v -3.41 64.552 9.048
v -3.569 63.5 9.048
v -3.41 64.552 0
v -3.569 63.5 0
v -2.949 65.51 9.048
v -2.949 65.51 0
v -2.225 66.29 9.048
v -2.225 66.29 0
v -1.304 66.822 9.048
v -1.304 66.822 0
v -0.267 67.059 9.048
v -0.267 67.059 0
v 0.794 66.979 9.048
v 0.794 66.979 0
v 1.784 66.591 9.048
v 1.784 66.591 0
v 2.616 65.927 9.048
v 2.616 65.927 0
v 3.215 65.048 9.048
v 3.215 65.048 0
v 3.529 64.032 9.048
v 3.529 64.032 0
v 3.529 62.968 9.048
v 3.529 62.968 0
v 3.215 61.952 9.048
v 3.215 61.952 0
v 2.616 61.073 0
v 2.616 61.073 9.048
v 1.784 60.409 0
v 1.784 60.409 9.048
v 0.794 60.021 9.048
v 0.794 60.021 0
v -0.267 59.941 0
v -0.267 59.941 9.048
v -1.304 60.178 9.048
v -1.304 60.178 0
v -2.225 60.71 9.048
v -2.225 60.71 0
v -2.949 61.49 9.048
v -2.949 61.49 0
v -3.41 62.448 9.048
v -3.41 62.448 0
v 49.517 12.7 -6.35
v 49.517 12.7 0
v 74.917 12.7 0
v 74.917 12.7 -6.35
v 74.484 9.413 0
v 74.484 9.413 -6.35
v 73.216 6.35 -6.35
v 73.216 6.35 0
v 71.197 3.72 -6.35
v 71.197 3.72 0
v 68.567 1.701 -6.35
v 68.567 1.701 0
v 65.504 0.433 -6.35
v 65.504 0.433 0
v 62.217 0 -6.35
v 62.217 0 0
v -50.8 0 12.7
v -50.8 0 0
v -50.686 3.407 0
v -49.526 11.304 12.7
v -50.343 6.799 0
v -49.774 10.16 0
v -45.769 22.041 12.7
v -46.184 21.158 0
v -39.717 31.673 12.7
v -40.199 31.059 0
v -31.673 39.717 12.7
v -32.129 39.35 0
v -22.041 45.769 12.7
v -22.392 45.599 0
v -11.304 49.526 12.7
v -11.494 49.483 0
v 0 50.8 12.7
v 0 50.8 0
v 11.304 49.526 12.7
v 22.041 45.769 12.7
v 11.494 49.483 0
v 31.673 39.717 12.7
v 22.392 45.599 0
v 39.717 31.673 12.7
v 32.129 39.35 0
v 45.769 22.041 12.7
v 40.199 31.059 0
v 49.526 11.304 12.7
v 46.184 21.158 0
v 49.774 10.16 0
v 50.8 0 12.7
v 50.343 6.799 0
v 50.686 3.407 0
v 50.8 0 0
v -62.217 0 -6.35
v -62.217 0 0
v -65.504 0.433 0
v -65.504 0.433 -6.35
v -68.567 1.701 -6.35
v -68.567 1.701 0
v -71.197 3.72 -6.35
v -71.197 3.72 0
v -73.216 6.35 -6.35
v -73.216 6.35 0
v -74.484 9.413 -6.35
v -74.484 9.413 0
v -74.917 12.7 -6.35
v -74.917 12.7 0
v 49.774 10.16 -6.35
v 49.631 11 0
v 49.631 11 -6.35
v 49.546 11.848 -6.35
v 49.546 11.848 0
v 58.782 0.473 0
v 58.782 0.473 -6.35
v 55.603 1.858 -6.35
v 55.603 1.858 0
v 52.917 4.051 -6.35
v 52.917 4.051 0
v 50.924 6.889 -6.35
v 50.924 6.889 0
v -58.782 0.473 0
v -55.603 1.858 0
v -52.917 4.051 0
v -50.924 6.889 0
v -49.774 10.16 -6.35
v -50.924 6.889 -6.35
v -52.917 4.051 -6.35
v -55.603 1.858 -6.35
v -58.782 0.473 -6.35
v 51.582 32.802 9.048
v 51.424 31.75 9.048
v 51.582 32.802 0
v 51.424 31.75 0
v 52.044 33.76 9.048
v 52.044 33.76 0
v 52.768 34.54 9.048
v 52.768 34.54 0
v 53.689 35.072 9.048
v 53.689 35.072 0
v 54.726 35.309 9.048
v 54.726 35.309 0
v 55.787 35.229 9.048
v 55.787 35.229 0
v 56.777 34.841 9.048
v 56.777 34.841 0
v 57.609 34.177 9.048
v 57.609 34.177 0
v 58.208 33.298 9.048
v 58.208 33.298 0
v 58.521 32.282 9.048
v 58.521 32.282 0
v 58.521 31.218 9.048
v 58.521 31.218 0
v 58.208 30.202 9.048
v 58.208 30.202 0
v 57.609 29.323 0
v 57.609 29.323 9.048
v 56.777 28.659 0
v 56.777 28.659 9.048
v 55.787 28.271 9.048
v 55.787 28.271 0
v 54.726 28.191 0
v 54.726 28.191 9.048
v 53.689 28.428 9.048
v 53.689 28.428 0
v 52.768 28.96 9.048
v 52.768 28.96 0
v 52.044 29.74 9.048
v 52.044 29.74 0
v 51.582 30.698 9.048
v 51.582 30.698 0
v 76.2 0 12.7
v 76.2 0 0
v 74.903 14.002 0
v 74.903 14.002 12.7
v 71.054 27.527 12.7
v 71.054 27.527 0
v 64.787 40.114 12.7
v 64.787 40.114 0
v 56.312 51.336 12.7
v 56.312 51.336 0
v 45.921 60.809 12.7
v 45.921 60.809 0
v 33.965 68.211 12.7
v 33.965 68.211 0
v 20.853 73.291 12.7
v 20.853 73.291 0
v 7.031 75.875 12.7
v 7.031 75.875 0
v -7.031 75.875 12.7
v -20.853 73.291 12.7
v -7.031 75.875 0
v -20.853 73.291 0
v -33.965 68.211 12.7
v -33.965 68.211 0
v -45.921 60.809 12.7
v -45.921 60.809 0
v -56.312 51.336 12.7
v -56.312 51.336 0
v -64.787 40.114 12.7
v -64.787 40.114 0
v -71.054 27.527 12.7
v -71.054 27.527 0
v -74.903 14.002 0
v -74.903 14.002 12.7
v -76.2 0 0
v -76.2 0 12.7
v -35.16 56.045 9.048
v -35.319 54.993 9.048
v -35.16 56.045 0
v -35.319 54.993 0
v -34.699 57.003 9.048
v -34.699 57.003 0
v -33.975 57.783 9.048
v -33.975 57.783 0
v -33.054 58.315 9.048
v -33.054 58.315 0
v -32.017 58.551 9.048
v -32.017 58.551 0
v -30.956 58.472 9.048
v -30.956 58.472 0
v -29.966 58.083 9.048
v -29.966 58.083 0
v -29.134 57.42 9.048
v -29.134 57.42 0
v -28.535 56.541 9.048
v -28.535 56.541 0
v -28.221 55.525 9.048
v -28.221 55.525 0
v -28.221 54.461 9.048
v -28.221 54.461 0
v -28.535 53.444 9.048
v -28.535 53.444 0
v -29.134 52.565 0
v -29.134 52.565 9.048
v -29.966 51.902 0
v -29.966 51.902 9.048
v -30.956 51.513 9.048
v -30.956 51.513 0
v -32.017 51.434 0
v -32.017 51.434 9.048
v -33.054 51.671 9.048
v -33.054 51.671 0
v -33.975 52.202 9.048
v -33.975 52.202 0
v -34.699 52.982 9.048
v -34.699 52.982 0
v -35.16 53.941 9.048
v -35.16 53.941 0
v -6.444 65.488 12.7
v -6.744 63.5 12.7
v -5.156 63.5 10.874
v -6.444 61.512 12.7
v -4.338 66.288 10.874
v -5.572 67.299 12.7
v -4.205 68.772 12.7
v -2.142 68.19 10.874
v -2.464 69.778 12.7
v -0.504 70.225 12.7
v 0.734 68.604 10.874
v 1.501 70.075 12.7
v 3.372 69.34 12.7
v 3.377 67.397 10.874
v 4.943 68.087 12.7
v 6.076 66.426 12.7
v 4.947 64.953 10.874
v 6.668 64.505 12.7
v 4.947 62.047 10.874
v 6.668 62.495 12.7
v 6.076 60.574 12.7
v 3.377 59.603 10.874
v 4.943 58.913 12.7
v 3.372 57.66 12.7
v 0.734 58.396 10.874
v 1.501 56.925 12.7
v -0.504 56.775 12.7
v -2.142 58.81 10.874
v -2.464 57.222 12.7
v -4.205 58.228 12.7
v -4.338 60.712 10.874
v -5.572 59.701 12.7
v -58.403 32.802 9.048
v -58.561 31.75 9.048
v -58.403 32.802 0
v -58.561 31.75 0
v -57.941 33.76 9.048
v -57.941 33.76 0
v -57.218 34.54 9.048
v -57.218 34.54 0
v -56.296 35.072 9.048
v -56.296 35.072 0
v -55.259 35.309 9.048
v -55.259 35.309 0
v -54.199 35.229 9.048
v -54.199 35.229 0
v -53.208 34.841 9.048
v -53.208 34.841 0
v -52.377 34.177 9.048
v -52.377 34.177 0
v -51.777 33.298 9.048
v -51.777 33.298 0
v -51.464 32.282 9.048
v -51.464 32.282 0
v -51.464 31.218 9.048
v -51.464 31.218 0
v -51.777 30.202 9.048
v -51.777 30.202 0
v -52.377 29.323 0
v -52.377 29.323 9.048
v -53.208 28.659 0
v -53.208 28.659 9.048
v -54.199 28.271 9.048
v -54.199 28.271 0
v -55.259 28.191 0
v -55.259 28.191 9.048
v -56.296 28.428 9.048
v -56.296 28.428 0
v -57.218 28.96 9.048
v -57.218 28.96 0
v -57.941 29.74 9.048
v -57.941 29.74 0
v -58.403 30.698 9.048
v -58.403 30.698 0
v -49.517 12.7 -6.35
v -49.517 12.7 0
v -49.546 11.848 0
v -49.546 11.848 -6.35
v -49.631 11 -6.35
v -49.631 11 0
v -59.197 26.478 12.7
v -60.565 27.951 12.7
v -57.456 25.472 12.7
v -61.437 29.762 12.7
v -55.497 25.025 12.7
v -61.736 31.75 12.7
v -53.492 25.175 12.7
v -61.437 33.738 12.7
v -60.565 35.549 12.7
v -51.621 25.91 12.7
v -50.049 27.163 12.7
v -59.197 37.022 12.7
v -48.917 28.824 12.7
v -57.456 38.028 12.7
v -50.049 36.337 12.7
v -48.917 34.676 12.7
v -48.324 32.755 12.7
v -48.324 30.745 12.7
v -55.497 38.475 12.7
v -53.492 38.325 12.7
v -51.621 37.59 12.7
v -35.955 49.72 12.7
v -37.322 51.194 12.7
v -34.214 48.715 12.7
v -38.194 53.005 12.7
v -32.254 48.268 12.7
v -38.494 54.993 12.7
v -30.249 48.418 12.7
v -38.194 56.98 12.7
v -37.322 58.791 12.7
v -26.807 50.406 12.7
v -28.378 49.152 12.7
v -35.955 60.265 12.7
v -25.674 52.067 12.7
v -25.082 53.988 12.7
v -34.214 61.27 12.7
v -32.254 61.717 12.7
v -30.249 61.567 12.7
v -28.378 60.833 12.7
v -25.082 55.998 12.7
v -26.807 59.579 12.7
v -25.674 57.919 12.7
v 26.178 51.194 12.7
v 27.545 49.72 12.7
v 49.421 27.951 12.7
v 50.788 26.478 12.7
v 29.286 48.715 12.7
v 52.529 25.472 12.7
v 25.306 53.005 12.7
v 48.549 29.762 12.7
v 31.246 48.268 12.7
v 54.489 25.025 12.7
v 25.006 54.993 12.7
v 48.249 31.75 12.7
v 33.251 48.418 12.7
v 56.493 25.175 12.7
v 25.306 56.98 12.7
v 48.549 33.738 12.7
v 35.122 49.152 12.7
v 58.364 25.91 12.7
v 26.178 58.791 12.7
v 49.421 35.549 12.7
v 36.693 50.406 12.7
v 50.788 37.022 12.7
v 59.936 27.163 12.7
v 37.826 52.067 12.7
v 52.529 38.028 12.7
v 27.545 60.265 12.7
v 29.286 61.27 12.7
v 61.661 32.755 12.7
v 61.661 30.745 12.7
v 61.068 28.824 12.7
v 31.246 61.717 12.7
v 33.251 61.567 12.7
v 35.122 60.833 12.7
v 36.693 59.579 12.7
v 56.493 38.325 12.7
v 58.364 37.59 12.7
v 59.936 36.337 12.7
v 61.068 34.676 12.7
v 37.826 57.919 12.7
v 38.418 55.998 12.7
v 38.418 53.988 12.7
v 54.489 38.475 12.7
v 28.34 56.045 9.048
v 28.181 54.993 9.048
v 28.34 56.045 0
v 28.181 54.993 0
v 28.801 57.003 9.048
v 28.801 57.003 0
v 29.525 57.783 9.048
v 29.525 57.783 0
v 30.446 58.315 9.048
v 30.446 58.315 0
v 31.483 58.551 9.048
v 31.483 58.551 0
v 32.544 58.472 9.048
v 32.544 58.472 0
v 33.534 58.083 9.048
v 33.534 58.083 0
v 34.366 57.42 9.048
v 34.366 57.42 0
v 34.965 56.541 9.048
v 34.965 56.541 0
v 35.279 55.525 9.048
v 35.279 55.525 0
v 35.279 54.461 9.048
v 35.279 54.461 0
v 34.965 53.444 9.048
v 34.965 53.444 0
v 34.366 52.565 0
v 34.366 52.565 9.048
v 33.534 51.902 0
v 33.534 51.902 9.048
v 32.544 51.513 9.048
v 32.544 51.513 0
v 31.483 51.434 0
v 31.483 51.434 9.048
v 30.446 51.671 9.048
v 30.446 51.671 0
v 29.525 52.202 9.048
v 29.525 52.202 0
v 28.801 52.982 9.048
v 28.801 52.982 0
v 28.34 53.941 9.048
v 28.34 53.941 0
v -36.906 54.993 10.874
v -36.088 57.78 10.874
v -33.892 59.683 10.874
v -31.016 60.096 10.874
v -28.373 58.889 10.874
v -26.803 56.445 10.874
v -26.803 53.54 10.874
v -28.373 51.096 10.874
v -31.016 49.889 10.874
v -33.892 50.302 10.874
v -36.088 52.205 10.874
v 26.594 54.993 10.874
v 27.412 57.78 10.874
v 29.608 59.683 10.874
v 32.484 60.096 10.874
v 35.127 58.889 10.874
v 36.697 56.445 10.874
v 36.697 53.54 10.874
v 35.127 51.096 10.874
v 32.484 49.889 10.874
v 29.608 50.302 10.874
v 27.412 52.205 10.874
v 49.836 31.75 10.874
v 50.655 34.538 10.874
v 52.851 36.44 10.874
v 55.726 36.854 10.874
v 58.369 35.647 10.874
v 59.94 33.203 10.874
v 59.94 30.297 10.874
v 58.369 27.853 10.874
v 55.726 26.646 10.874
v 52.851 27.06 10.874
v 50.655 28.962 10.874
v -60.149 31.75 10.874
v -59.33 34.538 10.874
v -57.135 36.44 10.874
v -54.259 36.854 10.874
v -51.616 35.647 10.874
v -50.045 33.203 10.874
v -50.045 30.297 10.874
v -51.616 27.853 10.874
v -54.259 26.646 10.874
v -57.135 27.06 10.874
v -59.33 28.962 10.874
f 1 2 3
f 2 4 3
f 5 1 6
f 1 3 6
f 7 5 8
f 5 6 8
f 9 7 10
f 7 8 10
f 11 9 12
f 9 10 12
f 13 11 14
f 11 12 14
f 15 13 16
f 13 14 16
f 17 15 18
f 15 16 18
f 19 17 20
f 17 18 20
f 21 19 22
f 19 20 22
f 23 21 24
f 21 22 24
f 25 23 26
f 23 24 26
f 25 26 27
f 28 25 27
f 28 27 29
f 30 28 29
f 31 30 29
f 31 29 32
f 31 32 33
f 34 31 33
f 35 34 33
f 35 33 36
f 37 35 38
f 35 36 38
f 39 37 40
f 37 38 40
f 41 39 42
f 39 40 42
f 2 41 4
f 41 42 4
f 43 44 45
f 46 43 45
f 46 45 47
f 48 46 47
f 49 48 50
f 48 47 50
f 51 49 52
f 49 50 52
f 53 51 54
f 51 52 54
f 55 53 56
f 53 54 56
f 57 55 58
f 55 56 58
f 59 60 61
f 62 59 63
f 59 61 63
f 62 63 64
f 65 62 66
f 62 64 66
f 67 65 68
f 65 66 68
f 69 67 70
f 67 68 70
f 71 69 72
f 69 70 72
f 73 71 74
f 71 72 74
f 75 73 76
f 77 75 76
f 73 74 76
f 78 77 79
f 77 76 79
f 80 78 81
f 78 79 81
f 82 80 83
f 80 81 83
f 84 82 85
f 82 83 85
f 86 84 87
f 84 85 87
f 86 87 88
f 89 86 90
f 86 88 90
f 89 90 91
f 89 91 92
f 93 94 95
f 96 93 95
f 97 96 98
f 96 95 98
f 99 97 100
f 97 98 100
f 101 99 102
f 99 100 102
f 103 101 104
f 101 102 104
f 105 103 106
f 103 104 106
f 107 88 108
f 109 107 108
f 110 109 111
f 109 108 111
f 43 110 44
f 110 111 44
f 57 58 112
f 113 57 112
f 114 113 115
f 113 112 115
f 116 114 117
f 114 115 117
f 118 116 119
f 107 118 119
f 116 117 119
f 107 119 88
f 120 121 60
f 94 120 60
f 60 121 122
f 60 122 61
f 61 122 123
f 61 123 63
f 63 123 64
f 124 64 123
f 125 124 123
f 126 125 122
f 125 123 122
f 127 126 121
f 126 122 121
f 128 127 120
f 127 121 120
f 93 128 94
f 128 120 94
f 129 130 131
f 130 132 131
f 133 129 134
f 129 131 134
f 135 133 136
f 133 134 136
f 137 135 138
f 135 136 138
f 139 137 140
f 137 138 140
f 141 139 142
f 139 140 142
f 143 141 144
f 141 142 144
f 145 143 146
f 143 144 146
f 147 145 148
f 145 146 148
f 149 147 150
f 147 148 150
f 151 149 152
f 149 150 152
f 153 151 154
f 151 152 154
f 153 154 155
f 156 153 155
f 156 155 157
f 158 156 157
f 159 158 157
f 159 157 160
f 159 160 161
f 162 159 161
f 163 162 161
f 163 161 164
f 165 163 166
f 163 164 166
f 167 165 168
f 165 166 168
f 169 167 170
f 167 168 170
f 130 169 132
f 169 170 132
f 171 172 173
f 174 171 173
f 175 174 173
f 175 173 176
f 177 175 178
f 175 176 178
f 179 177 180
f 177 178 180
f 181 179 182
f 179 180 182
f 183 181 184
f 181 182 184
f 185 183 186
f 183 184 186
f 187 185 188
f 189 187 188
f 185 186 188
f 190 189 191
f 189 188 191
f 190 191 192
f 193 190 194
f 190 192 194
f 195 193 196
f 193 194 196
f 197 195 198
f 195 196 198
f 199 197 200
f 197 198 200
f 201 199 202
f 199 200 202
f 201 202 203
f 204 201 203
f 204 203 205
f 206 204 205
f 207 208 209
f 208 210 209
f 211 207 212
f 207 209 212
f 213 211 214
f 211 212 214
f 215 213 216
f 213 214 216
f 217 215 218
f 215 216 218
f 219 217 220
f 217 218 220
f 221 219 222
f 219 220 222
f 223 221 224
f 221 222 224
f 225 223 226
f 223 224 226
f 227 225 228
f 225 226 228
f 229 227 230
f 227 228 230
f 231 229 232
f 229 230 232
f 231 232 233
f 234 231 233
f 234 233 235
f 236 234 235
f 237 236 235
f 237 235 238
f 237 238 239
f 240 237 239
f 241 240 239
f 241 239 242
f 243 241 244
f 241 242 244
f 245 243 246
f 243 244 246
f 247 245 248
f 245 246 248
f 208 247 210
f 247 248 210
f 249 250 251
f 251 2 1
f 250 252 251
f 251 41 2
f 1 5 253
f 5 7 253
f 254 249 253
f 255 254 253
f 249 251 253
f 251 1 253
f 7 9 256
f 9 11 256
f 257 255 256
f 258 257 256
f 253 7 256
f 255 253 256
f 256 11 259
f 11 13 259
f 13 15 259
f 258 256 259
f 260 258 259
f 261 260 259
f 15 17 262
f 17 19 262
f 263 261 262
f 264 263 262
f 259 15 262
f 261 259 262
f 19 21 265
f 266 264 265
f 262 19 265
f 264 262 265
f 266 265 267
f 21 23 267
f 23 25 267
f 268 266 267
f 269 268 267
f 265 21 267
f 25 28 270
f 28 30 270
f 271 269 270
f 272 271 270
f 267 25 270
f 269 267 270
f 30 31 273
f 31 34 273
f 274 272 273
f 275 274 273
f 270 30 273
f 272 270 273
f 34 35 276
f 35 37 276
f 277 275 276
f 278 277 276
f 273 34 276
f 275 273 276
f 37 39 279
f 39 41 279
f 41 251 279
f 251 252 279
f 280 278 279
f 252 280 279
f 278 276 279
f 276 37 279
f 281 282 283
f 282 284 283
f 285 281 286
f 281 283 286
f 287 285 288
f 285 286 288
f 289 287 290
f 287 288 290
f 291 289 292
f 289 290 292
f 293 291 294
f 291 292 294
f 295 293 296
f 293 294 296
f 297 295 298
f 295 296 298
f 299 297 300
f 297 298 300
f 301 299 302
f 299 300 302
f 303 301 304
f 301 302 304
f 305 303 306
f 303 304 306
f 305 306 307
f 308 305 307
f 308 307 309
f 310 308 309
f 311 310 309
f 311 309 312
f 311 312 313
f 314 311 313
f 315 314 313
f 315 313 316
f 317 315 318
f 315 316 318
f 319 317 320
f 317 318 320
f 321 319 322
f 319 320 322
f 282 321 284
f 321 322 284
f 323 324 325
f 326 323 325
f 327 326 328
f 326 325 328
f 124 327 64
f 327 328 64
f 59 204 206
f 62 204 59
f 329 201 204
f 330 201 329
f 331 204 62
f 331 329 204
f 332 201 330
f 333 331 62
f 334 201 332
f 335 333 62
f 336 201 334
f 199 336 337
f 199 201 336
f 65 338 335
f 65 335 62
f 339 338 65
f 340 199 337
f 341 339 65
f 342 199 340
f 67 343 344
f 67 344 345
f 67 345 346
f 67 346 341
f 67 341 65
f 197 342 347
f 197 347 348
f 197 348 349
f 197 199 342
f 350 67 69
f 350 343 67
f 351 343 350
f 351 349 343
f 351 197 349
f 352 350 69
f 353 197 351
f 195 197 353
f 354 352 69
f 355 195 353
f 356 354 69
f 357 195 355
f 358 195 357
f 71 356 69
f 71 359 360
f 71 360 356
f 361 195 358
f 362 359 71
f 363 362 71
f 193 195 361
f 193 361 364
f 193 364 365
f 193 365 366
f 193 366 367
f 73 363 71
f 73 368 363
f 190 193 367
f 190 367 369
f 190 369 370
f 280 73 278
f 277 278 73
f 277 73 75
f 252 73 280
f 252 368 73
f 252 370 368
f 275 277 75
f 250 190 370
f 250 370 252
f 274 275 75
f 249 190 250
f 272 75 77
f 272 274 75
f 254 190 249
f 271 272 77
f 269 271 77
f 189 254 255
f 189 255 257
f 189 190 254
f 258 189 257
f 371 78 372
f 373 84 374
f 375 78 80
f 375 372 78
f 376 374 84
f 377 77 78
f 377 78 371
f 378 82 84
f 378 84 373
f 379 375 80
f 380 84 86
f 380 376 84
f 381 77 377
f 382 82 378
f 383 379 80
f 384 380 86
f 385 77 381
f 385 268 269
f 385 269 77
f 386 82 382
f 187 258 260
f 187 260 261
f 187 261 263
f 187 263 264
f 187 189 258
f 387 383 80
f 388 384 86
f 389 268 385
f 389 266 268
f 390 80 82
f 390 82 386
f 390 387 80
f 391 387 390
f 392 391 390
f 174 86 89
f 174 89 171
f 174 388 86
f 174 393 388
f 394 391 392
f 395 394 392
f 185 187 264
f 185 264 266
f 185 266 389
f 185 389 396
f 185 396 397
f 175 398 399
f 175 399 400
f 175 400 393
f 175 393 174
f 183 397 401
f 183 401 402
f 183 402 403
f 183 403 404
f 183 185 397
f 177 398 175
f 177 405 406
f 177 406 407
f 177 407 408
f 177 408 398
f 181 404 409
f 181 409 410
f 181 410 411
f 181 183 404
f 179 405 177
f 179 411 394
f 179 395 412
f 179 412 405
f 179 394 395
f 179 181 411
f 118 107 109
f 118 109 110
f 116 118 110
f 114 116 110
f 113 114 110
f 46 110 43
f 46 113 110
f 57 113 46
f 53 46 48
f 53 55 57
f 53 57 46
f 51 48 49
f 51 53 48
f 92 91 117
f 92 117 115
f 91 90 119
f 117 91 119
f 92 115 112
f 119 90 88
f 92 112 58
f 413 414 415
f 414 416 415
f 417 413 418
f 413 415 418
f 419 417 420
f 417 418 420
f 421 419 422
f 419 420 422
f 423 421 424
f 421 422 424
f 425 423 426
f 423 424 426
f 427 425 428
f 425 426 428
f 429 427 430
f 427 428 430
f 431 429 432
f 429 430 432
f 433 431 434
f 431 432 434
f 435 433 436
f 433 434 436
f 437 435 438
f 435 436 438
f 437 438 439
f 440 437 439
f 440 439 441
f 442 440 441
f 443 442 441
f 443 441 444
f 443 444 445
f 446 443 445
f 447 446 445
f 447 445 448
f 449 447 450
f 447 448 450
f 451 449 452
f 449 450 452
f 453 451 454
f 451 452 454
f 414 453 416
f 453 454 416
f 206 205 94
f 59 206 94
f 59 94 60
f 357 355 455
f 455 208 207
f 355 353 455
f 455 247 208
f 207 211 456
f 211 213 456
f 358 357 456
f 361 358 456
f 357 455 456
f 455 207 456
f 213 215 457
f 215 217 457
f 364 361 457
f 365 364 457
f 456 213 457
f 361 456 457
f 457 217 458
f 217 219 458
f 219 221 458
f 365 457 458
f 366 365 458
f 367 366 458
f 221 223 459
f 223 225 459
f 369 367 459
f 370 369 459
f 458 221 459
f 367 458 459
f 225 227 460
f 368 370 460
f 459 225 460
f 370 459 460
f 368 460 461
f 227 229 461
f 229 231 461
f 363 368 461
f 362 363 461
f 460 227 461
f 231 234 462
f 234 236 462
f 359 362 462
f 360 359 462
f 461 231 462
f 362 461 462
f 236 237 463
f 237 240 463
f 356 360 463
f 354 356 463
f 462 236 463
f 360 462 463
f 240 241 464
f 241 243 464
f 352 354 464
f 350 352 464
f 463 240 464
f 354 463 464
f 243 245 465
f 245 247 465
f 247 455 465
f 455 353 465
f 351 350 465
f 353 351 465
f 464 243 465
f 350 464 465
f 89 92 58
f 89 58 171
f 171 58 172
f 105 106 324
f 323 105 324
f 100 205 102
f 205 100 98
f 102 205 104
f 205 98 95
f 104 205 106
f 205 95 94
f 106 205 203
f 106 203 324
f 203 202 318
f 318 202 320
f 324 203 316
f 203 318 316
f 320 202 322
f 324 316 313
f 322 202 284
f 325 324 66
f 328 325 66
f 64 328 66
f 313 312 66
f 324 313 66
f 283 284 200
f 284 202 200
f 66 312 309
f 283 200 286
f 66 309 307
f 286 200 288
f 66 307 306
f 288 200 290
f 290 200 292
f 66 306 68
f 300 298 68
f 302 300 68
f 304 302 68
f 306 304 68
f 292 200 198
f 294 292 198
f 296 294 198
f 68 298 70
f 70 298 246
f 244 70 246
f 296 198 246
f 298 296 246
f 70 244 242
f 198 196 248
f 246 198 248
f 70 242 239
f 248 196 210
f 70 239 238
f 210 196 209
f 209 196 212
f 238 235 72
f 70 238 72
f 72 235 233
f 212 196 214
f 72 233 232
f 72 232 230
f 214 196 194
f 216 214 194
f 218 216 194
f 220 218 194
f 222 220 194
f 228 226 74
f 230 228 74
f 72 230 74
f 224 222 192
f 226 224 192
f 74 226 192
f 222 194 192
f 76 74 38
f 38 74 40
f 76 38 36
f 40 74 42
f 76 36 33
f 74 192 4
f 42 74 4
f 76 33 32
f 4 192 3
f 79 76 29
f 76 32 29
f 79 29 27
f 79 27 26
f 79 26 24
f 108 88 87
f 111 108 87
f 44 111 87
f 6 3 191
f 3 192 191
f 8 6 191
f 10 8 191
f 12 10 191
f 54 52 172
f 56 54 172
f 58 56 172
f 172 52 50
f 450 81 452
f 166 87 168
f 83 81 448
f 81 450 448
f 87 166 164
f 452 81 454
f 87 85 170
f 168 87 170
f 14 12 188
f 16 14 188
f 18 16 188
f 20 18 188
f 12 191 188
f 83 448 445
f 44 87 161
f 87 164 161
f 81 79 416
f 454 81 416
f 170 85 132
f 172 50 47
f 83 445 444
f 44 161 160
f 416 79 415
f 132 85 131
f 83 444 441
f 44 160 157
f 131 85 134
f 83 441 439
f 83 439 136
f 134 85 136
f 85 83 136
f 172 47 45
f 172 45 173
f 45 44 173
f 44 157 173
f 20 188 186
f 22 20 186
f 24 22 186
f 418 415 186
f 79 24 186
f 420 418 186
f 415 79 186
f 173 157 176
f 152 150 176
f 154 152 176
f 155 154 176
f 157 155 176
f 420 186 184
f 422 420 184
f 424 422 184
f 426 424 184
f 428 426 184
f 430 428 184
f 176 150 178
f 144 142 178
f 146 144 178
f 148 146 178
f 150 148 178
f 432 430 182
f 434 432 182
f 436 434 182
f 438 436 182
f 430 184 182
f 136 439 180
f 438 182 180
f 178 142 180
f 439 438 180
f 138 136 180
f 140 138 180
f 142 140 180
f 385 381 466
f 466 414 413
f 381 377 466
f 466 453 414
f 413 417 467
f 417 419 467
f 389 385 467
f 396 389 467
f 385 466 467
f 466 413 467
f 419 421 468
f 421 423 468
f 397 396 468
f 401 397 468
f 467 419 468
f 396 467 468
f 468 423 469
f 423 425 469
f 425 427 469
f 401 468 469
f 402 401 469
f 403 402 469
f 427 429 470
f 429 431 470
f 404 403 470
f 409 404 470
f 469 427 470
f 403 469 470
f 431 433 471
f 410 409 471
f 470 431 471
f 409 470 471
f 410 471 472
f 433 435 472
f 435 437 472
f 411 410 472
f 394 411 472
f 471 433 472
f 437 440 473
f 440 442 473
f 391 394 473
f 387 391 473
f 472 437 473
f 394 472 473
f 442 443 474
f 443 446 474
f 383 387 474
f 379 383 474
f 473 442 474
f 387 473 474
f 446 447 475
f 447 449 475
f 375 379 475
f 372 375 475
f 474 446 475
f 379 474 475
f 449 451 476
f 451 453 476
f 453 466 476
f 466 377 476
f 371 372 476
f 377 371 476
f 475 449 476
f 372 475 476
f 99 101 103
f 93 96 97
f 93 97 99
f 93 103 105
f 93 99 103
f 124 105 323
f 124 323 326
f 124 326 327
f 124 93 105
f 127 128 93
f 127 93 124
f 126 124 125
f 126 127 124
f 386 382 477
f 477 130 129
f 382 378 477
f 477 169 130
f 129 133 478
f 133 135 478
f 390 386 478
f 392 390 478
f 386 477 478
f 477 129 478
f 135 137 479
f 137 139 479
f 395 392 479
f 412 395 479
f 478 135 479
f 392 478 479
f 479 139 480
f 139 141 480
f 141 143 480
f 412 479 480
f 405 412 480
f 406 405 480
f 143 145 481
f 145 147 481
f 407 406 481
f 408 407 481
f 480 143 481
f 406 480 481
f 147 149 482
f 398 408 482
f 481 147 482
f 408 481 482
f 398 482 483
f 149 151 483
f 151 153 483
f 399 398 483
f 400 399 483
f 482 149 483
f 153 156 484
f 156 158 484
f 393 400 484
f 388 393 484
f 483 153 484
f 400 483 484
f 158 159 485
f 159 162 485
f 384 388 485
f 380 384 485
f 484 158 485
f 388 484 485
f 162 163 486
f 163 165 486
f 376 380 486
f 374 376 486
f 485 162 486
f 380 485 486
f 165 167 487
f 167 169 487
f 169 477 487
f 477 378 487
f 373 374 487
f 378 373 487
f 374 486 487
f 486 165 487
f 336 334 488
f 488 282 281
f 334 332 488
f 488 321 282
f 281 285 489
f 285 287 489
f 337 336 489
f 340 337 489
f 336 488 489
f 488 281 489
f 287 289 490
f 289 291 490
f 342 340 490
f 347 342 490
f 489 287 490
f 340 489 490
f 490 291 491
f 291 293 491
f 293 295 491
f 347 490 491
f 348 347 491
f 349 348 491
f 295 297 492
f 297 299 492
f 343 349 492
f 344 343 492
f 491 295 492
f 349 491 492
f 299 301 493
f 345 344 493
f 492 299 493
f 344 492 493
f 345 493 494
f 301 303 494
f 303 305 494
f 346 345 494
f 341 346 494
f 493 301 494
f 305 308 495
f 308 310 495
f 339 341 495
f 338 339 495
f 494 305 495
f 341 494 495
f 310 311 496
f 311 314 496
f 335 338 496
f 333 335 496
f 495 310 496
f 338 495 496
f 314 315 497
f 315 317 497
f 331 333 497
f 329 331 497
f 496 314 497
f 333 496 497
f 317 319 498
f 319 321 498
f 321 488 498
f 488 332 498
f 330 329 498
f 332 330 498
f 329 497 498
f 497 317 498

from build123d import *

# Parameters (mm, degrees)
F1_DEPTH       = 12.7
F3_DEPTH       = 6.35
F5_D           = 7.1374
F5_CSINK_D     = 13.4874
F5_CSINK_ANGLE = 82


with BuildPart() as f1:
    # F0 (on Top) → F1 (new body)
    with BuildSketch(Plane.XY):
        with BuildLine():
            Line((-76.2, 0), (-50.8, 0))
            ThreePointArc((-50.8, 0), (0, 50.8), (50.8, 0))
            Line((50.8, 0), (76.2, 0))
            ThreePointArc((76.2, 0), (0, 76.2), (-76.2, 0))
        make_face()
    extrude(amount=F1_DEPTH)

    # F2 (on face) → F3 (join)
    with BuildSketch(Plane(origin=(0, 0, 0), x_dir=(1, 0, 0), z_dir=(0, 0, -1))):
        with BuildLine():
            Line((-74.9170394667, -12.7), (-49.5170394667, -12.7))
            ThreePointArc((-49.5170394667, -12.7), (-49.581350313, -11.4235362865), (-49.7736315316, -10.1600002047))
            ThreePointArc((-49.7736315316, -10.1600002047), (-54.1848541289, -2.8626223667), (-62.2170394667, 0))
            ThreePointArc((-62.2170394667, 0), (-71.1972955878, -3.7197438789), (-74.9170394667, -12.7))
        make_face()
        with BuildLine():
            ThreePointArc((62.2170394667, 0), (54.1848541308, -2.8626223652), (49.7736315325, -10.1600001999))
            ThreePointArc((49.7736315325, -10.1600001999), (49.5813503133, -11.423536284), (49.5170394667, -12.7))
            Line((49.5170394667, -12.7), (74.9170394667, -12.7))
            ThreePointArc((74.9170394667, -12.7), (71.1972955878, -3.7197438789), (62.2170394667, 0))
        make_face()
    extrude(amount=F3_DEPTH)

    # F5 (through all)
    with Locations(Plane.XY.offset(12.7)):
        with Locations((-54.9926131403, 31.75), (-31.75, 54.9926131403), (0, 63.5), (31.75, 54.9926131403), (54.9926131403, 31.75)):
            CounterSinkHole(F5_D / 2, F5_CSINK_D / 2, counter_sink_angle=F5_CSINK_ANGLE)


solid = f1.part
